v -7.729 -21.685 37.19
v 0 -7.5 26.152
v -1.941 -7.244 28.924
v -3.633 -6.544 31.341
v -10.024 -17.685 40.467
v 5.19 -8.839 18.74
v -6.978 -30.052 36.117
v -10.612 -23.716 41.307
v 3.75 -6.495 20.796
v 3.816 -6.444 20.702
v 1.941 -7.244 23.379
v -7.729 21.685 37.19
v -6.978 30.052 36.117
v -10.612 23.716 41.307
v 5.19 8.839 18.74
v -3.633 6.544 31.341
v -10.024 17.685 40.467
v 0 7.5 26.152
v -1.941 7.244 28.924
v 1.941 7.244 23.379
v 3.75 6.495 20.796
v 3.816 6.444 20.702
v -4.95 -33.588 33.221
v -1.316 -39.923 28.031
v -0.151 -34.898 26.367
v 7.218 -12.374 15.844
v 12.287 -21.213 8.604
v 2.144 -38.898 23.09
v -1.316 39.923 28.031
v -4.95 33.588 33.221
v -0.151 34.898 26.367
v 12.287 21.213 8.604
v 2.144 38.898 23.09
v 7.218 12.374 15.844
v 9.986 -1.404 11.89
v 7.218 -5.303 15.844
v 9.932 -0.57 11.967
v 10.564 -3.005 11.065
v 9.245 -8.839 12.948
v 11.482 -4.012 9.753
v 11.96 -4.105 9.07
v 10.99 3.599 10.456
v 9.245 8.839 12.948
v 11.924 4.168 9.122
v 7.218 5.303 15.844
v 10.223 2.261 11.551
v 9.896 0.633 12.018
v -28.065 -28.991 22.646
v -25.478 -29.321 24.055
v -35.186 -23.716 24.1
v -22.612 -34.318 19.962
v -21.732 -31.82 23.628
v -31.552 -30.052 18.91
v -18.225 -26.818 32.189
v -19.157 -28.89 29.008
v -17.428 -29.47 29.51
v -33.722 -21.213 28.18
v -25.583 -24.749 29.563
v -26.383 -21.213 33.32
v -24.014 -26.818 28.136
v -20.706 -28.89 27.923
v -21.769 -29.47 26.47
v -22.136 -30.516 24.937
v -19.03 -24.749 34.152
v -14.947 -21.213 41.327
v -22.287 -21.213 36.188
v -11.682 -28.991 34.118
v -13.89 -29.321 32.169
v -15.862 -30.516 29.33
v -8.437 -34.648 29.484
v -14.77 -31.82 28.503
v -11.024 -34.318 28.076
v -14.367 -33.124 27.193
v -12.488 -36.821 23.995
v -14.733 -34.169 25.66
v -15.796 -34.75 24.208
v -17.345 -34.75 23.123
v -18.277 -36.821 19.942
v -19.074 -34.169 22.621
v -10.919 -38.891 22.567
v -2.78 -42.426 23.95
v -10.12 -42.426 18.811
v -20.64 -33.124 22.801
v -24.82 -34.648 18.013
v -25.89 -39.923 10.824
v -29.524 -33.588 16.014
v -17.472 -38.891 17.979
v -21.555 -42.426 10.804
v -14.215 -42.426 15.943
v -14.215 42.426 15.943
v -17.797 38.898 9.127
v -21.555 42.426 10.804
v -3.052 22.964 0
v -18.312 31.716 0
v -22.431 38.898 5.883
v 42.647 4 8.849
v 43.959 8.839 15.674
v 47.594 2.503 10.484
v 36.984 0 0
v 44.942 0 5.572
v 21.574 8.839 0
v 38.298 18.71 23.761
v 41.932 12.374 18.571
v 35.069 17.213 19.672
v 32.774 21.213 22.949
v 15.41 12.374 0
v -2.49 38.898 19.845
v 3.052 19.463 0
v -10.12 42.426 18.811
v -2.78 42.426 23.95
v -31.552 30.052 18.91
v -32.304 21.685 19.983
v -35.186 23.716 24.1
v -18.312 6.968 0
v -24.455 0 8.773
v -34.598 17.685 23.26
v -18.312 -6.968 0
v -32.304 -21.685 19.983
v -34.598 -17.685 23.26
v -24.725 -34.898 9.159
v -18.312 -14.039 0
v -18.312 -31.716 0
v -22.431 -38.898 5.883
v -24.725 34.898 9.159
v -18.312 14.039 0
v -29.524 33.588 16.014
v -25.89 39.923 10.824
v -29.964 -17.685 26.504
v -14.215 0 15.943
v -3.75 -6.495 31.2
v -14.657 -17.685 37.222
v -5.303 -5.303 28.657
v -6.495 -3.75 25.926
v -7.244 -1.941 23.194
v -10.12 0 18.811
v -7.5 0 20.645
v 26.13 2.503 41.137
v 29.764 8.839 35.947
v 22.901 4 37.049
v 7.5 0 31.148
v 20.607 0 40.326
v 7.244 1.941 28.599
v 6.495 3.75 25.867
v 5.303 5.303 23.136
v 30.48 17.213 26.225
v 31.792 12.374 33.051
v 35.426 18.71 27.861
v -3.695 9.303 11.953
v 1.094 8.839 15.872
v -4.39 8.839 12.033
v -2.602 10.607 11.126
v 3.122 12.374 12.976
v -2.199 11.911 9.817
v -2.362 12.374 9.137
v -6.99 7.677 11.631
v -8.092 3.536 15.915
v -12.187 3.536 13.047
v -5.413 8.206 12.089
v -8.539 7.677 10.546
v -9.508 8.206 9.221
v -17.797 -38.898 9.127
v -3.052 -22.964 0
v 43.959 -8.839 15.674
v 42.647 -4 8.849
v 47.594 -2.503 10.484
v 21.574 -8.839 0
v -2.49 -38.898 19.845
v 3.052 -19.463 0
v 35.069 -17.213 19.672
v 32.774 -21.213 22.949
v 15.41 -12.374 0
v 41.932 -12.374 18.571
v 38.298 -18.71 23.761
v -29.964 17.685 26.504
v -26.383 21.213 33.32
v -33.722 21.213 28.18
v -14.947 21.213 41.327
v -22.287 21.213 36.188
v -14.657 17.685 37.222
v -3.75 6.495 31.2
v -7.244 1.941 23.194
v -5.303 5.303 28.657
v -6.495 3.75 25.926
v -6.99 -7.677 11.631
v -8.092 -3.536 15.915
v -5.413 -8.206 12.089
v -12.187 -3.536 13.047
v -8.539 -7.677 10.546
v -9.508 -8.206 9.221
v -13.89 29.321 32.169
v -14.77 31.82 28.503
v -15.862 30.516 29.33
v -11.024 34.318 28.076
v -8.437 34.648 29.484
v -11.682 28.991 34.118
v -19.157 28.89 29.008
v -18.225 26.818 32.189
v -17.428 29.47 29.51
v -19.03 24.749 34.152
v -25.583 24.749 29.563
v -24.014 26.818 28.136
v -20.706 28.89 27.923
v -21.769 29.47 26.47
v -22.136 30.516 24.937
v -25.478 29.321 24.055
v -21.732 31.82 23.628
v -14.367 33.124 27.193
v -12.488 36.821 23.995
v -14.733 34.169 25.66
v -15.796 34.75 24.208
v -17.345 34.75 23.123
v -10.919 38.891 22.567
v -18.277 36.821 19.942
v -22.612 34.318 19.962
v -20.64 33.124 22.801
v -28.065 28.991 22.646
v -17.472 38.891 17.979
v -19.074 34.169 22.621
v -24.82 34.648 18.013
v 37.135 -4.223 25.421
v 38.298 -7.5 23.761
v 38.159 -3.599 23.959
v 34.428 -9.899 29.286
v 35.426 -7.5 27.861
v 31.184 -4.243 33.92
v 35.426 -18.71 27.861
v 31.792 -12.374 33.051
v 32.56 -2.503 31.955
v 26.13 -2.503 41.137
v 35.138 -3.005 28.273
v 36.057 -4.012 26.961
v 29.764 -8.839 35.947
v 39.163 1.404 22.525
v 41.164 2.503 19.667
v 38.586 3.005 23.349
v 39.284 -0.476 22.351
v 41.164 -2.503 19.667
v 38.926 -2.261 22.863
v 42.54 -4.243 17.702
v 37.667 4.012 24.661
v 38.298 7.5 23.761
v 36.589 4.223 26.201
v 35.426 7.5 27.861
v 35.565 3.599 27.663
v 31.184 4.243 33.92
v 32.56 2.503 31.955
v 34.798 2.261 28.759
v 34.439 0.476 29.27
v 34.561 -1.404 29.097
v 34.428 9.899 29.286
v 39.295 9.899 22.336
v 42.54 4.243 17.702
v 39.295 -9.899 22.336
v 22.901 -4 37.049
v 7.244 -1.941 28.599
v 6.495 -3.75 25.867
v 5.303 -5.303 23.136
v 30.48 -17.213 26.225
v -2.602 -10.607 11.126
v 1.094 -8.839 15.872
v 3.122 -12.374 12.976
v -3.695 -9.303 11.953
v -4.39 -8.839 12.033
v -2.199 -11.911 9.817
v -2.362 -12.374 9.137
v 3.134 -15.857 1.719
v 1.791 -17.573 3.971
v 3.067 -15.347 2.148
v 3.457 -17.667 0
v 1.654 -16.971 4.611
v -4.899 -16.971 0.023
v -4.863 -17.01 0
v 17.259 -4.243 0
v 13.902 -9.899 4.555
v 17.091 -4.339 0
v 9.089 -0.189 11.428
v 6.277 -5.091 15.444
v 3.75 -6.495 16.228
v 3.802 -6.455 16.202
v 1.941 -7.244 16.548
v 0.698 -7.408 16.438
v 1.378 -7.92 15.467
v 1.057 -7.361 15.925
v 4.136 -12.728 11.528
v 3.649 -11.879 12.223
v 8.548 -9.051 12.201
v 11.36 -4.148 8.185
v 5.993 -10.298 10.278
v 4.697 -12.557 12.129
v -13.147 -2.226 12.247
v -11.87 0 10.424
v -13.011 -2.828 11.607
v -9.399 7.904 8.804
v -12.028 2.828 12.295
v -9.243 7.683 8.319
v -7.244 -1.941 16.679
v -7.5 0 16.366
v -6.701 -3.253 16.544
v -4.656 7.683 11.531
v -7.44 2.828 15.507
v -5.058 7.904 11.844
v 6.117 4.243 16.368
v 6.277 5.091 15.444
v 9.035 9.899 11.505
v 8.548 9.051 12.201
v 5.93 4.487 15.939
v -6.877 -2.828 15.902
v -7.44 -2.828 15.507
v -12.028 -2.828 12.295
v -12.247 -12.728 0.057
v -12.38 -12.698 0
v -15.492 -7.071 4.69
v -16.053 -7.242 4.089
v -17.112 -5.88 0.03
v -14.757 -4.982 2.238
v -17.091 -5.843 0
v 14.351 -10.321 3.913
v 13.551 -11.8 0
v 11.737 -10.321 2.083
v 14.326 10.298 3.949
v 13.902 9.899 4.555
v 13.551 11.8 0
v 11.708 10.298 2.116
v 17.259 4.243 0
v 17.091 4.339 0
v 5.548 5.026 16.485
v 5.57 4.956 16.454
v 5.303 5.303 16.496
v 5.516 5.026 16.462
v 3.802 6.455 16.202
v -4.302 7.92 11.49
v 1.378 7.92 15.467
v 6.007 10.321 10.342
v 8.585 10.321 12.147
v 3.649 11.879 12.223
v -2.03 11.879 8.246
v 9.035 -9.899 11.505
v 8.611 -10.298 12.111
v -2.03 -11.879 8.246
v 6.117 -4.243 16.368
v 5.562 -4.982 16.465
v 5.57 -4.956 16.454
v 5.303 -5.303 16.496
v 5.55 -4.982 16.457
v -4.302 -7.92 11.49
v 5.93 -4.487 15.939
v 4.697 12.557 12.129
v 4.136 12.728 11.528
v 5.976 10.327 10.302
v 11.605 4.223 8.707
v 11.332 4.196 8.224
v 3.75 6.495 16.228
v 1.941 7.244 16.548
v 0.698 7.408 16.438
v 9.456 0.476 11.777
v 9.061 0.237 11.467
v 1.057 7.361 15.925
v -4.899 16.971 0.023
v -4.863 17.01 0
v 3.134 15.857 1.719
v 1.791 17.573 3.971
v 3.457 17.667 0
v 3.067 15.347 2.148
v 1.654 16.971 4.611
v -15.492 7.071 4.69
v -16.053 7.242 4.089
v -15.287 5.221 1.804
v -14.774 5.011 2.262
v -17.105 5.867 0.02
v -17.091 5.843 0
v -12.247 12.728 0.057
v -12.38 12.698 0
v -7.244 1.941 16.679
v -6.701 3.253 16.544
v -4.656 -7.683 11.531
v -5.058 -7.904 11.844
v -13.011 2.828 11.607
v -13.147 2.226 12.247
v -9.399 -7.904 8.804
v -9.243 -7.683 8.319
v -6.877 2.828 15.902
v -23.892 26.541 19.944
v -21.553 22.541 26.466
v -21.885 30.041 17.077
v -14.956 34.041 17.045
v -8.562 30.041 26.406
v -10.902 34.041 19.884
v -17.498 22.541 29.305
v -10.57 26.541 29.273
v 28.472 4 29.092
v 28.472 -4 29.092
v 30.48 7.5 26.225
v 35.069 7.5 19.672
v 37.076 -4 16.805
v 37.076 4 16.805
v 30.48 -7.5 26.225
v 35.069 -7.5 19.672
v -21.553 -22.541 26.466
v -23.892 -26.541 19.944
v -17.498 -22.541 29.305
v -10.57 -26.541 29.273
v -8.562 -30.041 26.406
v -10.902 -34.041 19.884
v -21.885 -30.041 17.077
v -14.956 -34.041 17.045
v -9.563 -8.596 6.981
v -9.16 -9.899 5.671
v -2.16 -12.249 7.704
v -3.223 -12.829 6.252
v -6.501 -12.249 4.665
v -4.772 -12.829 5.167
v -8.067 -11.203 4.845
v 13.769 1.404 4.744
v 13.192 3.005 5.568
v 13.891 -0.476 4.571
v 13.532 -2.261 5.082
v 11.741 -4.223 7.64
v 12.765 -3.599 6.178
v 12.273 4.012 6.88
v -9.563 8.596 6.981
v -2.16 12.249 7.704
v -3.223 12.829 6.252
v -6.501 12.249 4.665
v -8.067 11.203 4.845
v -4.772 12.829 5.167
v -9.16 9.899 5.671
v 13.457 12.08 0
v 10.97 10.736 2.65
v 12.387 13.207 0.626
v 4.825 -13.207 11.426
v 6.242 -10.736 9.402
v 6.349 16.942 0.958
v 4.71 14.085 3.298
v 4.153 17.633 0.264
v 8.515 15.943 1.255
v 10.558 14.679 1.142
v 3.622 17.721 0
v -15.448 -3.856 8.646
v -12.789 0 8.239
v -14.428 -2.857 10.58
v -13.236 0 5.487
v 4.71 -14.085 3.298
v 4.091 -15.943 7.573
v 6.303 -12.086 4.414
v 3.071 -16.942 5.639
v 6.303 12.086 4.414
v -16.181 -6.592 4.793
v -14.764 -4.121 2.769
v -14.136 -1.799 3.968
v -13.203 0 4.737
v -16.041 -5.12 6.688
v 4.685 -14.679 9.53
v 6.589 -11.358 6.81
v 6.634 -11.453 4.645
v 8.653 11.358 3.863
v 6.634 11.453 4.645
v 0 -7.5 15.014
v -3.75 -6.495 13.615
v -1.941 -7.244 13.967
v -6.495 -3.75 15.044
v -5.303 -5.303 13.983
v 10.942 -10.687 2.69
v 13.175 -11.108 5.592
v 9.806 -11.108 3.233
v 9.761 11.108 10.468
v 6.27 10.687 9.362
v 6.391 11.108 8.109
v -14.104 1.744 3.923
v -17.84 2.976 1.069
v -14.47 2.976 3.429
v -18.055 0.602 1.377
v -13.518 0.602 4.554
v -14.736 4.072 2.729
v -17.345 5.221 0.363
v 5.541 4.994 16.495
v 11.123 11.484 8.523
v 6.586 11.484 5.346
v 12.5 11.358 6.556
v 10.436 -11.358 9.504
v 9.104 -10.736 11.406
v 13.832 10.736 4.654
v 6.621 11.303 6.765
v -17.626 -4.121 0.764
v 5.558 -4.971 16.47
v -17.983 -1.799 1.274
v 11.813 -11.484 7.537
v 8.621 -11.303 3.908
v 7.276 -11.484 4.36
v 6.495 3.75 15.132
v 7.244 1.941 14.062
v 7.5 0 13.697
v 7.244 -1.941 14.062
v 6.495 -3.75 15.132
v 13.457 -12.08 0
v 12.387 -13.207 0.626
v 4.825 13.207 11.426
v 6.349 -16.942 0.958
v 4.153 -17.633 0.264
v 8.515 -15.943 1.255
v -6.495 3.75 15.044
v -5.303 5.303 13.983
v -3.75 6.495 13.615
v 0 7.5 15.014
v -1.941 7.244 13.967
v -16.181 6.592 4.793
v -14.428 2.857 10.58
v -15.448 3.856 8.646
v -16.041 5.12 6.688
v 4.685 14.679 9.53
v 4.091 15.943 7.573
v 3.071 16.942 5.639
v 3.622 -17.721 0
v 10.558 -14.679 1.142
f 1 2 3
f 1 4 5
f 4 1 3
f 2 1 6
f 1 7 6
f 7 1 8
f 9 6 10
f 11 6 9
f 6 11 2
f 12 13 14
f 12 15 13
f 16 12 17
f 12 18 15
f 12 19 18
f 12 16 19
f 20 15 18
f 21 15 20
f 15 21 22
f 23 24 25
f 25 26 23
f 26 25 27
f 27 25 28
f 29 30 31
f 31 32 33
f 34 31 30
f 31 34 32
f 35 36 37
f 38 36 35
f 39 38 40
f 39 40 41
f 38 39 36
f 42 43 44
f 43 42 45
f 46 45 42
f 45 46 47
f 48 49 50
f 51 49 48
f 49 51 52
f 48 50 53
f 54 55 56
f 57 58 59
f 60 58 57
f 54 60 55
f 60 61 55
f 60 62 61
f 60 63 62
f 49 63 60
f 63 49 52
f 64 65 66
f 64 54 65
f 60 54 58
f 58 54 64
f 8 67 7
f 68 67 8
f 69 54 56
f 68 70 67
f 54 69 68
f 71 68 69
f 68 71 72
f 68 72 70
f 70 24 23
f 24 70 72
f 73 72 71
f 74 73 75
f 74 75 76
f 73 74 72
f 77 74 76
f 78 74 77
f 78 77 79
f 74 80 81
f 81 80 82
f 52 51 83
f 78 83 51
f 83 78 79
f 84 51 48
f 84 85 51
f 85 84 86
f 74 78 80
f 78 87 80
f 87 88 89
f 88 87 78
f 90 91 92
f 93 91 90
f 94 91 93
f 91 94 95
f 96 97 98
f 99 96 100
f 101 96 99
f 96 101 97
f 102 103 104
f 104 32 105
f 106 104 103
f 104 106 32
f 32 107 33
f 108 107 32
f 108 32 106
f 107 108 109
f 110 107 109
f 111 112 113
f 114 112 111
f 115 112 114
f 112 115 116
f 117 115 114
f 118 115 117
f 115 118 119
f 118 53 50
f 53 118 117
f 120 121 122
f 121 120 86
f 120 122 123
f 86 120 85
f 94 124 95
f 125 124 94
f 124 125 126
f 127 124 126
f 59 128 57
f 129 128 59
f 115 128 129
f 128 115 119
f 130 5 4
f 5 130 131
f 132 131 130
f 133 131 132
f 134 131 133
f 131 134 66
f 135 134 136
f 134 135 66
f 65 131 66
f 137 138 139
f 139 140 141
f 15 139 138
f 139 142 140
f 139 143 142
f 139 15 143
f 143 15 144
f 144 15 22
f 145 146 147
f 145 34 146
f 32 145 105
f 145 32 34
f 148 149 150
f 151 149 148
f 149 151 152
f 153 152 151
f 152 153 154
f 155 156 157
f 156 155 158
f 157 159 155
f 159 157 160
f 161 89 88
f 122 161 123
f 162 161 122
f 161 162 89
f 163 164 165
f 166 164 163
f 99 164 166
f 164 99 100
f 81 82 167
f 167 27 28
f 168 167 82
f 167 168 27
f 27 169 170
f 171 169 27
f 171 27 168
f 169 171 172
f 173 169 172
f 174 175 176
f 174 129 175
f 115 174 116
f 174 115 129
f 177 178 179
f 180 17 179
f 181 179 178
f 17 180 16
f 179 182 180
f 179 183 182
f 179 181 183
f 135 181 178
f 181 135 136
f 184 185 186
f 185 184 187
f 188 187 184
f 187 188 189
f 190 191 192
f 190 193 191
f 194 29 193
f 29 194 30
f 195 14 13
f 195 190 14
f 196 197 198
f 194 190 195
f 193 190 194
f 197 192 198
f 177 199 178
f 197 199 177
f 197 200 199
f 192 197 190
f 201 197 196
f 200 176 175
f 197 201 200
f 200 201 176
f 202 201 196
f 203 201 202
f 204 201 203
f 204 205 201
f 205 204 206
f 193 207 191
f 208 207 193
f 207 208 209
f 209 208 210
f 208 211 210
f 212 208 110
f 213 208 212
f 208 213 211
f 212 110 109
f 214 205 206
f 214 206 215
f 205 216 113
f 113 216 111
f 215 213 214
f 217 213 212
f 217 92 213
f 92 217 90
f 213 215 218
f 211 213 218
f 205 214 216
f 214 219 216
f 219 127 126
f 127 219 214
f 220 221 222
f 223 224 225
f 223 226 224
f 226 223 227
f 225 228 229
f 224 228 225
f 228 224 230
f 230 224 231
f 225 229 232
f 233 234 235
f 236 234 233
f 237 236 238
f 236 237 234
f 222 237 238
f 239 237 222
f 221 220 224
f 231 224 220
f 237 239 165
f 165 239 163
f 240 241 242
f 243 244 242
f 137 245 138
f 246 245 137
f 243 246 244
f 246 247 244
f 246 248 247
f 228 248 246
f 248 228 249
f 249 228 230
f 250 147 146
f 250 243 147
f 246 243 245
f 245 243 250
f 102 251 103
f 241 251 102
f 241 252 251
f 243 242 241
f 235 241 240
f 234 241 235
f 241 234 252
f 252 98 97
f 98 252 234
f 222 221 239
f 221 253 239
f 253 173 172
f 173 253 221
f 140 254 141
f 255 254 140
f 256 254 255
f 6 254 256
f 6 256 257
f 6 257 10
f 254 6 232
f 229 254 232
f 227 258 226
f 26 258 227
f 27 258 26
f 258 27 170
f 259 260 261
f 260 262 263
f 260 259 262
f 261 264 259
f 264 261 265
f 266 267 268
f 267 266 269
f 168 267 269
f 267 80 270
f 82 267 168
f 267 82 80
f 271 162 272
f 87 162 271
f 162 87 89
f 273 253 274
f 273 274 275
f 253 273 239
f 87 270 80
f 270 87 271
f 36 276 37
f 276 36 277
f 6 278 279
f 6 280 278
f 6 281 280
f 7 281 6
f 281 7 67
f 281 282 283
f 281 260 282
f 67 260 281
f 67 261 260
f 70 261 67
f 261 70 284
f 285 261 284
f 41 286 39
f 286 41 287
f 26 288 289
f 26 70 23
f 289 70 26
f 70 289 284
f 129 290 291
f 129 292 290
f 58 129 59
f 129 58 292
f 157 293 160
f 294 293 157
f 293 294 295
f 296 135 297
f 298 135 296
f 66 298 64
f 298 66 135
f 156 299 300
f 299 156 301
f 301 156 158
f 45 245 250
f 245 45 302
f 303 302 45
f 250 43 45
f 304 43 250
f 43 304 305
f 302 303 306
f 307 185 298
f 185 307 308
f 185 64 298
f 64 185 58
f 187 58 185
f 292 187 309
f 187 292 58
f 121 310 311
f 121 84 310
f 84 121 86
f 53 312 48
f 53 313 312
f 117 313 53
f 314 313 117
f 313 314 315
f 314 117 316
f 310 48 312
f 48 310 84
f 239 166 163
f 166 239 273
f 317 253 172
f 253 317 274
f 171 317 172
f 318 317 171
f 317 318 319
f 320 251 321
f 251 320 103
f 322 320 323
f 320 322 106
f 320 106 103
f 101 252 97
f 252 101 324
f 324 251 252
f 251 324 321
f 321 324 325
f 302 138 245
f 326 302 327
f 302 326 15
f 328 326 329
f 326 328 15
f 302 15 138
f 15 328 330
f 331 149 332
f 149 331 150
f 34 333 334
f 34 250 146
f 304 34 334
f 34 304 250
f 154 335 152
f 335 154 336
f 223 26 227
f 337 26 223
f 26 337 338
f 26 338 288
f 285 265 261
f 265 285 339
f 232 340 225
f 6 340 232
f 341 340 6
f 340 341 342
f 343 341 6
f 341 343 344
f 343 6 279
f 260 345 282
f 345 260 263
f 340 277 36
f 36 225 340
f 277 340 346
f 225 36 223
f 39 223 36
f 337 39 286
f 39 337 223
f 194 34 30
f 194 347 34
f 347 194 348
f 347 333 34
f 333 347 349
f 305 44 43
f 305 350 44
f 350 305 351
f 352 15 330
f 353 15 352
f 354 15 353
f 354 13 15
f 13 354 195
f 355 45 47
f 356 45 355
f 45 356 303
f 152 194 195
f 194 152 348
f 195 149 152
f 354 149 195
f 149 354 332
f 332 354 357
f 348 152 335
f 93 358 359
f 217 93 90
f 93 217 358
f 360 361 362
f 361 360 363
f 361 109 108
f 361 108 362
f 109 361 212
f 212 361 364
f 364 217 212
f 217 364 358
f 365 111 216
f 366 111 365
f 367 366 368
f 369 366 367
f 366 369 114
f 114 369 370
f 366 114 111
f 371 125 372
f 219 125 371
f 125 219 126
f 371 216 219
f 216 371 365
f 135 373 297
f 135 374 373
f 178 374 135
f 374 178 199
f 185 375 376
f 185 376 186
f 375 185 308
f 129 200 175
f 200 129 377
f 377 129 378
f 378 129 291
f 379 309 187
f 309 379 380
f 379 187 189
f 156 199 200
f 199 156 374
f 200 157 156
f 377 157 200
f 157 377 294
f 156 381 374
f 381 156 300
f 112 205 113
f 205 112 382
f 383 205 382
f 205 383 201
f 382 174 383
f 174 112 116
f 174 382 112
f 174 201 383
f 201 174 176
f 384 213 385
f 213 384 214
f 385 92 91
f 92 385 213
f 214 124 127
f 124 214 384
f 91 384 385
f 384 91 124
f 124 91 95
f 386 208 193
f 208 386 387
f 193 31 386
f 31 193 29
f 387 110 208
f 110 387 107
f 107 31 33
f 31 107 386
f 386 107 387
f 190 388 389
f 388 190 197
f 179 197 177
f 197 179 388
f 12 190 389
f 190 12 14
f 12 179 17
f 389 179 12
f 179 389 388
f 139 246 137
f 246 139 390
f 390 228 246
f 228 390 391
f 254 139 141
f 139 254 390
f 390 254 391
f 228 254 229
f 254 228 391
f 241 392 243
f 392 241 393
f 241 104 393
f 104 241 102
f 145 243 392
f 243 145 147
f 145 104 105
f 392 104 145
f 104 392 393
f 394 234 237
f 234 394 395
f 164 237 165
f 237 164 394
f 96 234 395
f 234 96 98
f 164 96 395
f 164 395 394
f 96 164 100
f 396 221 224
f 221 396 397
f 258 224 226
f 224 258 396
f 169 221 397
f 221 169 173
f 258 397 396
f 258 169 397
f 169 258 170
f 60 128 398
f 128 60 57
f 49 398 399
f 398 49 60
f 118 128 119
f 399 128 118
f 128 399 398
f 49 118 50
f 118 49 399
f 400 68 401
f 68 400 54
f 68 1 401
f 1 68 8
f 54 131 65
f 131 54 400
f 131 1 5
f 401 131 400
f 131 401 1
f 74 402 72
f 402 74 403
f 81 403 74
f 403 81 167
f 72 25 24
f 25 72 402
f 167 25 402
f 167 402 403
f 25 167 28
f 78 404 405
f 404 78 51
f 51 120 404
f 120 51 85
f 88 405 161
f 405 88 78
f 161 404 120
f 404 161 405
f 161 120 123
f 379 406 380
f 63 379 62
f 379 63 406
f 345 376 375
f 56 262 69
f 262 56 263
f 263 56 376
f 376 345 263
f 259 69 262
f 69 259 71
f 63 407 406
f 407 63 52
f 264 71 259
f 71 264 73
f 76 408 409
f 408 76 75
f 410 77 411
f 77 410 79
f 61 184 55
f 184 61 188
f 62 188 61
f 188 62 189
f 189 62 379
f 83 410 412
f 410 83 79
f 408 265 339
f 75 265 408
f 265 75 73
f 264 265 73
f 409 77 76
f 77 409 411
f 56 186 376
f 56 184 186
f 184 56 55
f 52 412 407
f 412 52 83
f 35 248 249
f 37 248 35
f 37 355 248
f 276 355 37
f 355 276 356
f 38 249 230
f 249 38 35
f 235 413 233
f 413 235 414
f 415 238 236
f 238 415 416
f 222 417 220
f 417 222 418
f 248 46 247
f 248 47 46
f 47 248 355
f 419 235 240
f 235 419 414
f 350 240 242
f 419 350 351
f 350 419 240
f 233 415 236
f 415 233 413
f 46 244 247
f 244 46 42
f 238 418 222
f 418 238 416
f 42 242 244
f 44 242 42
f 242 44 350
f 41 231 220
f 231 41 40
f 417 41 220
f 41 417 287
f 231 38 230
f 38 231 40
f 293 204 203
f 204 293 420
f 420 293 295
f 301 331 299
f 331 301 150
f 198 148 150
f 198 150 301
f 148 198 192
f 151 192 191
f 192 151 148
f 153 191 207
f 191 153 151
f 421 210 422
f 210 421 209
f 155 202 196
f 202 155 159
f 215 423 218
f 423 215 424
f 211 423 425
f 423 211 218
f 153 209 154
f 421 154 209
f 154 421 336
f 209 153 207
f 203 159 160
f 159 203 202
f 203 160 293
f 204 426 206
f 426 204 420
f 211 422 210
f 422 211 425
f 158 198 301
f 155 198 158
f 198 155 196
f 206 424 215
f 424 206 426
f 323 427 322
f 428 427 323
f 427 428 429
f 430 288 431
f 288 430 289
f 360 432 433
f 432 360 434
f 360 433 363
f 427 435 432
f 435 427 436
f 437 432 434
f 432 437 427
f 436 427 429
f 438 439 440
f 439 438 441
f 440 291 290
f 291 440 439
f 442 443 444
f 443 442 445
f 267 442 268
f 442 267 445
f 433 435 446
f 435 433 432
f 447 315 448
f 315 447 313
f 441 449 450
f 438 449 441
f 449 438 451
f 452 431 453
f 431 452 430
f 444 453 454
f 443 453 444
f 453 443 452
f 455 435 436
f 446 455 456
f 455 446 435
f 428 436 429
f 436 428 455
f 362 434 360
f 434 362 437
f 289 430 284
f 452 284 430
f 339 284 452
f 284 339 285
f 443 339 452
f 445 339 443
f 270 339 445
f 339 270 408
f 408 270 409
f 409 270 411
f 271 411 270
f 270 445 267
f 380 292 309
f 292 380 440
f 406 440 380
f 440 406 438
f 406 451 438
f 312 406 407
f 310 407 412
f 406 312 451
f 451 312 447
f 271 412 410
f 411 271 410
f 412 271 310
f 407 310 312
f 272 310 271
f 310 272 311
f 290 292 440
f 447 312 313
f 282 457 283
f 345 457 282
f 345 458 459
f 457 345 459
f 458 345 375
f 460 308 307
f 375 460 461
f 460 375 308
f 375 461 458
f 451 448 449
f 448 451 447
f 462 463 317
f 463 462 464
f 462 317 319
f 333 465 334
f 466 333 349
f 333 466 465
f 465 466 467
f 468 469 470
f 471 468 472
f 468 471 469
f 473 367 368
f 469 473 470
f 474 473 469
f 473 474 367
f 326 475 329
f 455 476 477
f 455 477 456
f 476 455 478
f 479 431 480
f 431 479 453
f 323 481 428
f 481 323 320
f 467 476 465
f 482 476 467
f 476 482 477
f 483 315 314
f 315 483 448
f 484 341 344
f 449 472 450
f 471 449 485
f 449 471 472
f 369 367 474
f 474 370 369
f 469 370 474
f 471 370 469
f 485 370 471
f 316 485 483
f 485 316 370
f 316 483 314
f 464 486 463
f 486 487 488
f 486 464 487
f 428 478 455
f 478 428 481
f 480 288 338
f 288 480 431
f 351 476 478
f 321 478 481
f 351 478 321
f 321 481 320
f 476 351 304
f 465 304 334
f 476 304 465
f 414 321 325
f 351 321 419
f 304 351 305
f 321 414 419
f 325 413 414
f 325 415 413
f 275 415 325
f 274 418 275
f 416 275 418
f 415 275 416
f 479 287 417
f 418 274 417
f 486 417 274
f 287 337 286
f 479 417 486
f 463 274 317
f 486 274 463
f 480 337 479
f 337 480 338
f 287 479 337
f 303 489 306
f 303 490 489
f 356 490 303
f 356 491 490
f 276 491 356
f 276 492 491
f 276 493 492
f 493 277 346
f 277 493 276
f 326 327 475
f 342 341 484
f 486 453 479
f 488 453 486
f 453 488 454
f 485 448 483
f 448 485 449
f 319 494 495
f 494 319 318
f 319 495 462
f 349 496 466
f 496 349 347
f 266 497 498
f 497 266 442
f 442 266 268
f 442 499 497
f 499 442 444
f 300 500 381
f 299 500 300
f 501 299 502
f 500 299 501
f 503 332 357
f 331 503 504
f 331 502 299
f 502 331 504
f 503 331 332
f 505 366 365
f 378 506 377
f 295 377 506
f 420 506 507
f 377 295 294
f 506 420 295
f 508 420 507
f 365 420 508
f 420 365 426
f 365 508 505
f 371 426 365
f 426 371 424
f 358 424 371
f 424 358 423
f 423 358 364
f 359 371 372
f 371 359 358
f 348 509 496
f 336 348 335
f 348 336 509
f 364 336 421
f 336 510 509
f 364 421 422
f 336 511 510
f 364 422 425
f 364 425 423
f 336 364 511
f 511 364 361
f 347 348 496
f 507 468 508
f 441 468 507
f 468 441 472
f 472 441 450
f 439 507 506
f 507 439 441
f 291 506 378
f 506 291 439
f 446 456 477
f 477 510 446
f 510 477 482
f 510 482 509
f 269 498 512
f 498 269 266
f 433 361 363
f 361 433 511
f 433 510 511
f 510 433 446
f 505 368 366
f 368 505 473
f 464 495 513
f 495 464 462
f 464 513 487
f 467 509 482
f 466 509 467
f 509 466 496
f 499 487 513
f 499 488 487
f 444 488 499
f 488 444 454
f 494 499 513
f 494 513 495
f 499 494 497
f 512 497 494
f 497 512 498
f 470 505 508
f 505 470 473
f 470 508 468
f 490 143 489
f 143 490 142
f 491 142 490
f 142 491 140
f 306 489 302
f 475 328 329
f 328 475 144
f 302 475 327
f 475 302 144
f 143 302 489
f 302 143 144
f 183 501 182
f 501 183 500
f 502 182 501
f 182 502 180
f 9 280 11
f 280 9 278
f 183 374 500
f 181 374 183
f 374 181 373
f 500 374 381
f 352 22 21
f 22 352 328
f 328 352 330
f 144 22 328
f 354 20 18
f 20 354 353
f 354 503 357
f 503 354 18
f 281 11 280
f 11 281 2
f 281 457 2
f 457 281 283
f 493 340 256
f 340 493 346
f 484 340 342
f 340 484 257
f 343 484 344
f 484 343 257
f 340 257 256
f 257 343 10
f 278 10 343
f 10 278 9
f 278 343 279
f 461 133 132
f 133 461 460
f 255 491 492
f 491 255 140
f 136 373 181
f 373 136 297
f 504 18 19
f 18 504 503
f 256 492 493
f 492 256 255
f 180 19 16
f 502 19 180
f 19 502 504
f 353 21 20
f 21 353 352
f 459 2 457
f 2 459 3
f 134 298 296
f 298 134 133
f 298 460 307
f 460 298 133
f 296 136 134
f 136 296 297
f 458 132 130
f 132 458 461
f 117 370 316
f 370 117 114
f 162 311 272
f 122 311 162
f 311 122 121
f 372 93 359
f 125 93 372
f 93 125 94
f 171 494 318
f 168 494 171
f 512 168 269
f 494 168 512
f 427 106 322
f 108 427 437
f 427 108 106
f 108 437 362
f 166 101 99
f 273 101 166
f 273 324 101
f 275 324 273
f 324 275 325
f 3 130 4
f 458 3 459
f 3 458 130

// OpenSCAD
// file: globals.scad
/*
Most things in this file is represented as one millimeter, so keep that in mind while changing things.
Some of the setting are not mm but at variables that you can set, such as 2*x=2x and you are setting what x is.
I will try to specify when things are variables and not exact measurements.
*/

obj_leg = 30;
leg_length = 5.5;
small_number = 0.001;
metal_core_rode_global = 5;


///////////////// number of holes /////////////////////
z_hole_number = 8;
other_holes = 8;

///////////////// Pins /////////////////////

//pins that poke out
ball_size = 10;
pin_height = 20;
pin_diameter = 6;


//holes
hole_ball_size = ball_size;
hole_pin_height = pin_height;
hole_pin_diameter = pin_diameter;

///////////////// Z THINGS /////////////////////

berring_slot_width = 7.5;
berring_slot_depth = 6.5;
metal_core_rode = 5;

///////////////// X THINGS /////////////////////

//male dove tails
max_width=8;
min_width=5;
depth=5;
height=obj_leg/2;

//female dove tails, this is found on the y mounts
girl_max_width=11;
girl_min_width=5;
girl_depth=5;
girl_height=obj_leg;


///////////////// Y THINGS /////////////////////
/*
The Y is so normal that all of those global variables at the top should change all of the setting in it, this section is set her incase there are variables set in the future development of this project.
*/
// file: include.scad
//////////////////      END SECTION       //////////////////

	module added_pins(){
		difference(){
			union(){
				translate([30/(15/4),obj_leg*leg_length,30/(15/4)]) pin();
				translate([30/(15/4)+14.5,obj_leg*leg_length,30/(15/4)+14]) pin();
			}
			union(){
							translate([30/(15/4)+13.5,obj_leg*leg_length-20,30/(15/4)+5])cube(size=[2,40,15]);
							translate([30/(15/4)+7.5,obj_leg*leg_length-20,30/(15/4)+15])rotate([0,90,0]) cube(size=[2,40,15]);	

							translate([30/(15/4)-1,obj_leg*leg_length-20,30/(15/4)-8])cube(size=[2,40,15]);
							translate([30/(15/4)-10,obj_leg*leg_length-20,30/(15/4)+1])rotate([0,90,0]) cube(size=[2,40,15]);
			}
		}
	}
	module taken_pins() {
		translate([30/(15/4)+14,obj_leg*leg_length-10,30/(15/4)]) mirror_pin();
		translate([30/(15/4),obj_leg*leg_length-10,30/(15/4)+15]) mirror_pin();
	}


//////////////////      OTHER STUFF       //////////////////

	module holes() {
		rotate([0,0,90]) for(y=[0:other_holes])
		translate([obj_leg+y*15,-15.5,7.5]) union() {
			translate([7.5,0,15]) hole_up();
			hole_down();
		}
	}
	module extend_holes() {
	module top(){
		rotate([0,0,90]) for(y=[0:other_holes+1])
		translate([(30/4)+y*15,-15.5,7.5]) union() {
			translate([7.5,0,15]) hole_up();
		}
	}
	module bottom(){
		rotate([0,0,90]) for(y=[0:other_holes+2])
		translate([(30/4)+y*15,-15.5,7.5]) union() {
			hole_down();
		
}
	}
	union(){
		top();
		bottom();
	}
	}

	module hole() {
		union() {
			rotate([90, 90, 0]) cylinder(h=40, d=hole_pin_diameter, center=true);
			translate([0,7.5,0]) sphere(d=hole_ball_size);
			translate([0,-6,0]) sphere(d=hole_ball_size);
		}
	}
	module hole_up() {
		union() {
			rotate([90, 90, 0]) cylinder(h=40, d=hole_pin_diameter, center=true);
			translate([0,7.5,10]) cylinder(h=hole_pin_height, d=hole_pin_diameter, center=true);
			translate([0,-6,10]) cylinder(h=hole_pin_height, d=hole_pin_diameter, center=true);
			translate([0,7.5,0]) sphere(d=hole_ball_size);
			translate([0,-6,0]) sphere(d=hole_ball_size);
		}
	}
	module hole_down() {
		union() {
			rotate([90, 90, 0]) cylinder(h=40, d=hole_pin_diameter, center=true);
			translate([0,7.5,-10]) cylinder(h=hole_pin_height, d=hole_pin_diameter, center=true);
			translate([0,-6,-10]) cylinder(h=hole_pin_height, d=hole_pin_diameter, center=true);
			translate([0,7.5,0]) sphere(d=hole_ball_size);
			translate([0,-6,0]) sphere(d=hole_ball_size);
		}
	}
	module pin() {
		union() {
			rotate([90, 90, 0]) cylinder(h=pin_height, d=pin_diameter, center=true);
			translate([0,7.5,0]) sphere(d=ball_size);
		}
	}

	module mirror_pin() {
		rotate([90, 90, 0]) cylinder(h=hole_pin_height+small_number, d=hole_pin_diameter, center=true);
		translate([0,-(pin_height-(ball_size/2)),0]) sphere(d=ball_size);
	}


//////////////////      SOME RACK AND Z THINGS       //////////////////

module z_holes() {
    rotate([0,-90,0]) for(z=[0:z_hole_number])
    translate([22.5+z*15,16,-12])
        hole();
}

module pin_cuts() {
	union(){
		cube(size=[2,10,40], center=true);
		rotate([0,0,90]) cube(size=[2,10,40], center=true);
	}
}
module pin_uncut() {
	union(){
		rotate([0, 0, 90]) cylinder(h=hole_pin_height, d=hole_pin_diameter, center=true);
		translate([0,0,10]) sphere(d=ball_hole);
	}
}


module pin_out() {
	union(){
		rotate([0, 0, 90]) cylinder(h=pin_height, d=pin_diameter, center=true);
		translate([0,0,10]) sphere(d= ball_size);
	}
}


module pins_z(){
	difference() {
		pin_out();
		pin_cuts();
	}
}
//////////////////      RACK AND SLIDE     ///////////////////

module straight_pins() {
	for(z=[0:((((obj_leg*leg_length)*2)-(obj_leg*2))/3)/14.5]) rotate([-90,0,0]) translate([z*15,30/(15/4),14]) pins_z();
	for(z=[0:((((obj_leg*leg_length)*2)-(obj_leg*2))/3)/14.5]) rotate([-90,0,0]) translate([z*15,30/(15/4)-14,14]) pins_z();
}
module stagger_pins() {
	for(z=[0:((((obj_leg*leg_length)*2)-(obj_leg*2))/3)/14.5]) rotate([-90,0,0]) translate([z*15,30/(15/4),14]) pins_z();
	for(z=[0:((((obj_leg*leg_length)*2)-(obj_leg*2))/3)/14.5]) rotate([-90,0,0]) translate([z*15+7,30/(15/4)-14,14]) pins_z();
}


//////////////////      DOVE TAIL       //////////////////

module male_dovetail(height) {
	dovetail_3d(max_width,min_width,depth,height);
}

module dovetail_3d(max_width=11, min_width=5, depth=5, height=30) {
	linear_extrude(height=height, convexity=2)
		dovetail_2d(max_width,min_width,depth);
}

module dovetail_2d(max_width=11, min_width=5, depth=5) {
	angle=atan((max_width/2-min_width/2)/depth);
	echo("angle: ", angle);
	polygon(paths=[[0,1,2,3,0]], points=[[-min_width/2,0], [-max_width/2,depth], [max_width/2, depth], [min_width/2,0]]);
}

//bow tie
	module tie_end(height){
				rotate([0,0,0]) translate([0,-0.01,((obj_leg/2)/2)]) male_dovetail(height);
				rotate([0,90,0]) translate([0,-0.01,((obj_leg/2)/2)]) male_dovetail(height);
				rotate([0,180,0]) translate([0,-0.01,((obj_leg/2)/2)]) male_dovetail(height);
				rotate([0,-90,0]) translate([0,-0.01,((obj_leg/2)/2)]) male_dovetail(height);
	}

module bow_support(){
	difference(){
		intersection(){
			translate([-15,0,-15]) cube([30,9,30]);
			scale([1.05,1.05,1.05]) rotate([0,45,0]) tie_end();
		}
		cube([29.2,29.2,29.2], center=true);
	}
}

	module wrap(){
		depth = 30;
				translate([-15,30,15]) rotate([90,180,90]) male_dovetail(height=depth);
				rotate([0,90,0]) translate([-15,30,15]) rotate([90,180,90]) male_dovetail(height=depth);
				rotate([0,180,0]) translate([-15,30,15]) rotate([90,180,90]) male_dovetail(height=depth);
				rotate([0,-90,0]) translate([-15,30,15]) rotate([90,180,90]) male_dovetail(height=depth);
	}
// main file
include <include.scad>;
include <globals.scad>;
    support = false;
	slot_translate = .5;
	rod_size = .5;
module basic_corner(){
	module added(){
			translate([0,0,15]) cube([obj_leg,obj_leg,obj_leg*2], center=true);
			translate([0,15,0]) cube([obj_leg,obj_leg*2,obj_leg], center=true);
			translate([15,0,0]) cube([obj_leg*2,obj_leg,obj_leg], center=true);
	}
	module taken(){
		cylinder(d=8.5, h=obj_leg*5, center=true);
		rotate([0,90,0]) cylinder(d=8.5, h=obj_leg*5, center=true);
		rotate([90,0,0]) cylinder(d=8.5, h=obj_leg*5, center=true);
		cylinder(d=23, h=28, center=true);
		rotate([0,90,0]) cylinder(d=23, h=28, center=true);
		rotate([90,0,0]) cylinder(d=23, h=28, center=true);
		module wrap(){
			translate([0,-15,0]) male_dovetail(height=50);
			rotate([0,0,90]) translate([0,-15,0]) male_dovetail(height=50);
			rotate([0,0,180]) translate([0,-15,0]) male_dovetail(height=50);
			rotate([0,0,-90]) translate([0,-15,0]) male_dovetail(height=50);
		}
		wrap();
		rotate([0,90,0]) wrap();
		rotate([-90,90,0]) wrap();
		rotate([0,45,180]) translate([0,-45,0]) tie_end();
		rotate([0,45,90]) translate([0,-45,0]) tie_end();
		rotate([-90,0,45]) translate([0,-45,0]) tie_end();

	}
	module corner() {
		difference(){
			added();
			taken();
		}
	};
	rotate([45,0,0]) corner();
};
module full_corner(){
	module support_pillers(){
		
		translate([48-slot_translate/2,3,0]) cylinder(h=11,d=4);
		translate([48-slot_translate/2,-3,0]) cylinder(h=11,d=4);
		
		translate([39-slot_translate/2,18,24]) rotate([0,-40,0]) cylinder(h=6,d=4);
		translate([39-slot_translate/2,-18,24]) rotate([0,-40,0]) cylinder(h=6,d=4);
	}
	if (support==true)
	{
		support_pillers();
		rotate([0,0,(360/3)*2]) support_pillers();
		rotate([0,0,(360/3)*1]) support_pillers();
	}
	difference(){
		translate([0,0,0]) rotate([0,-35,0])basic_corner();
		union(){
			cylinder(h=50, d=15);
			//translate([-20,0,0]) cylinder(h=50, d=7);
			//translate([10,17,0]) cylinder(h=50, d=7);
			//translate([10,-17,0]) cylinder(h=50, d=7);
			translate([0,0,-25]) cube([200,200,50], center=true);
		}
	}
}

full_corner();
